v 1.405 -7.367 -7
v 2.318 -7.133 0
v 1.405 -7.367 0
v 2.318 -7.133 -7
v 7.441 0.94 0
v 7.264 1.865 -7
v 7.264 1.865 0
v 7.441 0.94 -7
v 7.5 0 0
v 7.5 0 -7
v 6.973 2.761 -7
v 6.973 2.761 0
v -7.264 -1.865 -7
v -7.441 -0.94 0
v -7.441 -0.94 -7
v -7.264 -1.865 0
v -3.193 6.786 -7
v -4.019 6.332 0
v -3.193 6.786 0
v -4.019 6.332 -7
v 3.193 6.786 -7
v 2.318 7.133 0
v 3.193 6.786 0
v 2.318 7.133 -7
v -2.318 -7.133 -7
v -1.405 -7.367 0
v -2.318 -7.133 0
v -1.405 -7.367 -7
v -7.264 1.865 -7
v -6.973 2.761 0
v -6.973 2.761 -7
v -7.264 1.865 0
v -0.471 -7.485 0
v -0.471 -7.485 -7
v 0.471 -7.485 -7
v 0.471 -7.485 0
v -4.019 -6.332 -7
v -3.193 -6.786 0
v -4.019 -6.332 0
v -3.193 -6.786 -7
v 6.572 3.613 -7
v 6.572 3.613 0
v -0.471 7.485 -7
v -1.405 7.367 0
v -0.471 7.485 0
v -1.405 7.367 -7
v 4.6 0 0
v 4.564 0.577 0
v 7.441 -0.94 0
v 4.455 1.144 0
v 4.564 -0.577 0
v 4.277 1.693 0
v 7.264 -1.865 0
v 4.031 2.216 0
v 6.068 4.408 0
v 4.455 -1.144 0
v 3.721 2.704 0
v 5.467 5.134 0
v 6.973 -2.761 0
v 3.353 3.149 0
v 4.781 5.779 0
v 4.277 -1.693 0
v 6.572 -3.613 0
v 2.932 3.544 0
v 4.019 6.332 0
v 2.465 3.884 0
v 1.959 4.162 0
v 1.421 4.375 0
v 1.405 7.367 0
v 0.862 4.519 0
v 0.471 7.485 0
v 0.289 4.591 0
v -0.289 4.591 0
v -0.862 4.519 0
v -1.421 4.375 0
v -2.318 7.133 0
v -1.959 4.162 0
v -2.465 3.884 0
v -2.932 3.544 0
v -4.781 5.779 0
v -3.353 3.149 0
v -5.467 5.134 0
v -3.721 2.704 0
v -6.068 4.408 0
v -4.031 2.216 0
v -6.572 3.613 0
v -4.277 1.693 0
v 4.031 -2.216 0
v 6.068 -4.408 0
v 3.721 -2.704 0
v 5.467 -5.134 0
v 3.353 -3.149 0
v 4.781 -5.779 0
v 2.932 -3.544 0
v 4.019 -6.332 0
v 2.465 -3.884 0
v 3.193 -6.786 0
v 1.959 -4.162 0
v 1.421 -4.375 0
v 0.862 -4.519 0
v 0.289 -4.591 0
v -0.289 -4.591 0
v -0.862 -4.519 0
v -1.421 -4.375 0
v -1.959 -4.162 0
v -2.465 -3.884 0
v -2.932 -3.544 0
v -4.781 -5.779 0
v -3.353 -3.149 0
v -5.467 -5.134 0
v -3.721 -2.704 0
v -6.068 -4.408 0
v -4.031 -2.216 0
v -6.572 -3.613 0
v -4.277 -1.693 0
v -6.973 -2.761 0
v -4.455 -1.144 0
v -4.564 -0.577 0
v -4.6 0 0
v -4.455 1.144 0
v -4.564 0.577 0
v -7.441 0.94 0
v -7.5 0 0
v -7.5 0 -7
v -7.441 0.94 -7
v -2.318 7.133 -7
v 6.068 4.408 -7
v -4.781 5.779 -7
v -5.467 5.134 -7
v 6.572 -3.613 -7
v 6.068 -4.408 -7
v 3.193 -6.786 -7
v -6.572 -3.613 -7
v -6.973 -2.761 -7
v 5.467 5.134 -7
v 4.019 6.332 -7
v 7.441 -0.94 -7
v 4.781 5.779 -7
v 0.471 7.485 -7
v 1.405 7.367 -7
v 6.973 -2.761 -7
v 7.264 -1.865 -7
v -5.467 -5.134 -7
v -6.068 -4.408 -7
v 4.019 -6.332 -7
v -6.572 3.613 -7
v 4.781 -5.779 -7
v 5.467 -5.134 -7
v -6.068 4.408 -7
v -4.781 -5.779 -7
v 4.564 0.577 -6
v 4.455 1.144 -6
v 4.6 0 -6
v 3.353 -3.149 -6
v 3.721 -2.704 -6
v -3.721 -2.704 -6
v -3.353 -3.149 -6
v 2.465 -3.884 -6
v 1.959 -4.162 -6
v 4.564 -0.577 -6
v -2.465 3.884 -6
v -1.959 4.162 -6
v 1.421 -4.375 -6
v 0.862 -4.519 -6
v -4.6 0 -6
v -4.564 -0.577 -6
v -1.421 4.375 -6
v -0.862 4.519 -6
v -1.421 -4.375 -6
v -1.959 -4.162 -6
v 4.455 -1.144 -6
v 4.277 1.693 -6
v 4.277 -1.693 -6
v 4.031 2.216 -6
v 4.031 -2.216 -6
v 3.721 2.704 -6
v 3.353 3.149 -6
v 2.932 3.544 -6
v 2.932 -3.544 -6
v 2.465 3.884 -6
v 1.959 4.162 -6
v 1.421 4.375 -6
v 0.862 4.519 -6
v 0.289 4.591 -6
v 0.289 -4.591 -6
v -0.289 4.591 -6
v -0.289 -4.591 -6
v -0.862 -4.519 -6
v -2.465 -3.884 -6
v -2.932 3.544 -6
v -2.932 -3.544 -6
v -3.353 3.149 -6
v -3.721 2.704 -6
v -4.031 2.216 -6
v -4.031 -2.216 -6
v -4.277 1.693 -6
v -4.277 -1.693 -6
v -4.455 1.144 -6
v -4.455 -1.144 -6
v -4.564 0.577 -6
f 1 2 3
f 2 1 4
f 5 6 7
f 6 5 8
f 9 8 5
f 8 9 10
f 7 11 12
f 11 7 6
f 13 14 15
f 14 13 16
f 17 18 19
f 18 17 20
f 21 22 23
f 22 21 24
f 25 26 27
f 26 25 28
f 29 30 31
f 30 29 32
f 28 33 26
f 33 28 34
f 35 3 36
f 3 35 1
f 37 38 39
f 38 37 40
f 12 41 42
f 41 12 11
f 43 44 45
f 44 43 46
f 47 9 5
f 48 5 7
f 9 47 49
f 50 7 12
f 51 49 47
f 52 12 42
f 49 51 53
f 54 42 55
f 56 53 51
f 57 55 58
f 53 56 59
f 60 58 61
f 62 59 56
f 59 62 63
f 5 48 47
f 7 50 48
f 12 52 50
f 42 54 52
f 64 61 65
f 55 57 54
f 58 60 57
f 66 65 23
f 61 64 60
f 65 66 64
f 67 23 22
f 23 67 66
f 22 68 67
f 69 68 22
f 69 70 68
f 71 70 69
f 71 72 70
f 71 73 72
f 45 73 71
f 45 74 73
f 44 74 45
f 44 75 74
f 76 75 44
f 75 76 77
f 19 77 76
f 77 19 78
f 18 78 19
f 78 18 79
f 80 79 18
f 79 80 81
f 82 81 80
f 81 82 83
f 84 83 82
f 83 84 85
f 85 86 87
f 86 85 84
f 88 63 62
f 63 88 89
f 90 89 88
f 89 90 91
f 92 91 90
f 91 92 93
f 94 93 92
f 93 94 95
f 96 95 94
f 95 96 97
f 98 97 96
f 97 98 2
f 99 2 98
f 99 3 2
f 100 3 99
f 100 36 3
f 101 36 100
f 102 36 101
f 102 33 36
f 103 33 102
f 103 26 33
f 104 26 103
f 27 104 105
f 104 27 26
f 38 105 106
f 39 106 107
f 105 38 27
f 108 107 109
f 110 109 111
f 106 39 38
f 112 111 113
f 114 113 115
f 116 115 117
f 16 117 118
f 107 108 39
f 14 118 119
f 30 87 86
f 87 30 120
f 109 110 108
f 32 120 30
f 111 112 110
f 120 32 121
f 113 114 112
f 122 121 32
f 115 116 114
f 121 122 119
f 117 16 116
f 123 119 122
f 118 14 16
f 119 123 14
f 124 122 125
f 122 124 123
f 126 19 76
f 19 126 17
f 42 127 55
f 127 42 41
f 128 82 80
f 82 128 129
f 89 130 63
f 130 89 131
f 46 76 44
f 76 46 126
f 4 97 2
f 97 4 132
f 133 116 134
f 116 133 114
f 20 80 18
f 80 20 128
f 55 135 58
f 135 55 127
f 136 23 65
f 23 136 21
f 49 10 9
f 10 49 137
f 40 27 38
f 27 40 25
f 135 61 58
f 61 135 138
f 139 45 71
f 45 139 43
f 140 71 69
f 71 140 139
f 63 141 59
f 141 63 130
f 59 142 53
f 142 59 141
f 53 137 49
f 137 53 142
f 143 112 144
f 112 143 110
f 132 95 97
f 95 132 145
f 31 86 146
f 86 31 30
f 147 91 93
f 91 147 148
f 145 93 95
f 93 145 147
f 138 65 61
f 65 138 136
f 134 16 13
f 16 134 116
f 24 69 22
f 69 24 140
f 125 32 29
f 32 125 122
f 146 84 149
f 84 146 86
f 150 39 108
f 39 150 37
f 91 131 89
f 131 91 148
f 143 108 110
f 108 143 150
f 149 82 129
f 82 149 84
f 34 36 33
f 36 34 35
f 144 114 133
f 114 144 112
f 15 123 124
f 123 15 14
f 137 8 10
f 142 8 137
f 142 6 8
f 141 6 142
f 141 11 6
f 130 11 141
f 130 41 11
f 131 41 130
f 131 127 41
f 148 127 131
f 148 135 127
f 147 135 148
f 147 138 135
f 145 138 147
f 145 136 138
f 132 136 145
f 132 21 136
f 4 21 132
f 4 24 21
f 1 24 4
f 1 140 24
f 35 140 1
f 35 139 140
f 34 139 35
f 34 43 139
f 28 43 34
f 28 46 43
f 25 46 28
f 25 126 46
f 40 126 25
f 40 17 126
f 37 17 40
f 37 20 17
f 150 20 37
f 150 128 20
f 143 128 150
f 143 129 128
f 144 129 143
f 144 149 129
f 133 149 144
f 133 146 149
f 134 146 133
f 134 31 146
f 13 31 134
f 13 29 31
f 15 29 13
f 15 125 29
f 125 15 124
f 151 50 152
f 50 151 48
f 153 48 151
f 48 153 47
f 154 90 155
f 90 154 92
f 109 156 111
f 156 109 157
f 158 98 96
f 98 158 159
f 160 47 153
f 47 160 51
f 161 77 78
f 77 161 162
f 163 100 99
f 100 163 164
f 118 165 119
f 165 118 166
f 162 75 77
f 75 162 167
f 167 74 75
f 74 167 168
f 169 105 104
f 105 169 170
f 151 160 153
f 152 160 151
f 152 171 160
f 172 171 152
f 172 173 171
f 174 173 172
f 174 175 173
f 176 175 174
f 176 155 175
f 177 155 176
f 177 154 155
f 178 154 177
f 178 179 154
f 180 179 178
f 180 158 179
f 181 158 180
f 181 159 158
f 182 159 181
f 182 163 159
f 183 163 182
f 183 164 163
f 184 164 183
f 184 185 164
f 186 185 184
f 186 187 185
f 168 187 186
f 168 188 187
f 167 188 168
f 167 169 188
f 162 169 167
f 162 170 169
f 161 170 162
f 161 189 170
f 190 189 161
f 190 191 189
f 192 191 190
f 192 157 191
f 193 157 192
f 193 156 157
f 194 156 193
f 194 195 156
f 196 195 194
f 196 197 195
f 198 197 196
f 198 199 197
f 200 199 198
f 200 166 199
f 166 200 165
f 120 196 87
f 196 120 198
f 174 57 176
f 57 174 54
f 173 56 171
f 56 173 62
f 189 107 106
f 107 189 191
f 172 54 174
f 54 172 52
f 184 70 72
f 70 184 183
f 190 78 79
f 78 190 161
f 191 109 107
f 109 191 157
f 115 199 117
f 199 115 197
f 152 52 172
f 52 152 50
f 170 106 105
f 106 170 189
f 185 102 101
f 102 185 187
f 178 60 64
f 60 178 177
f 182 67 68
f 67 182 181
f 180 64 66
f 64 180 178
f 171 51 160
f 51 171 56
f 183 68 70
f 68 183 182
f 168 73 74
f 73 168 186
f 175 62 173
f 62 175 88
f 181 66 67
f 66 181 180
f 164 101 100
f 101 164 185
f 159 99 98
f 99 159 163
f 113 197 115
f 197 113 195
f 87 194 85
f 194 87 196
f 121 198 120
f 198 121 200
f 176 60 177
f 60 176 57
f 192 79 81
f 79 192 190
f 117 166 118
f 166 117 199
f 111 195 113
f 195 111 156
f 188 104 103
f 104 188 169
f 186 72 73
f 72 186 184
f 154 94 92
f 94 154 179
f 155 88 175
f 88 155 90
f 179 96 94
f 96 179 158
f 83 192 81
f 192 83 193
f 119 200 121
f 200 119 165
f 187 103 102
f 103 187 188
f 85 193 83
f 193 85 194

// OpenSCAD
$fn = 50;


difference() {
	union() {
		translate(v = [0, 0, -7.0000000000]) {
			cylinder(h = 7, r = 7.5000000000);
		}
	}
	union() {
		#translate(v = [0, 0, -6.0000000000]) {
			cylinder(h = 6, r = 4.6000000000);
		}
	}
}
